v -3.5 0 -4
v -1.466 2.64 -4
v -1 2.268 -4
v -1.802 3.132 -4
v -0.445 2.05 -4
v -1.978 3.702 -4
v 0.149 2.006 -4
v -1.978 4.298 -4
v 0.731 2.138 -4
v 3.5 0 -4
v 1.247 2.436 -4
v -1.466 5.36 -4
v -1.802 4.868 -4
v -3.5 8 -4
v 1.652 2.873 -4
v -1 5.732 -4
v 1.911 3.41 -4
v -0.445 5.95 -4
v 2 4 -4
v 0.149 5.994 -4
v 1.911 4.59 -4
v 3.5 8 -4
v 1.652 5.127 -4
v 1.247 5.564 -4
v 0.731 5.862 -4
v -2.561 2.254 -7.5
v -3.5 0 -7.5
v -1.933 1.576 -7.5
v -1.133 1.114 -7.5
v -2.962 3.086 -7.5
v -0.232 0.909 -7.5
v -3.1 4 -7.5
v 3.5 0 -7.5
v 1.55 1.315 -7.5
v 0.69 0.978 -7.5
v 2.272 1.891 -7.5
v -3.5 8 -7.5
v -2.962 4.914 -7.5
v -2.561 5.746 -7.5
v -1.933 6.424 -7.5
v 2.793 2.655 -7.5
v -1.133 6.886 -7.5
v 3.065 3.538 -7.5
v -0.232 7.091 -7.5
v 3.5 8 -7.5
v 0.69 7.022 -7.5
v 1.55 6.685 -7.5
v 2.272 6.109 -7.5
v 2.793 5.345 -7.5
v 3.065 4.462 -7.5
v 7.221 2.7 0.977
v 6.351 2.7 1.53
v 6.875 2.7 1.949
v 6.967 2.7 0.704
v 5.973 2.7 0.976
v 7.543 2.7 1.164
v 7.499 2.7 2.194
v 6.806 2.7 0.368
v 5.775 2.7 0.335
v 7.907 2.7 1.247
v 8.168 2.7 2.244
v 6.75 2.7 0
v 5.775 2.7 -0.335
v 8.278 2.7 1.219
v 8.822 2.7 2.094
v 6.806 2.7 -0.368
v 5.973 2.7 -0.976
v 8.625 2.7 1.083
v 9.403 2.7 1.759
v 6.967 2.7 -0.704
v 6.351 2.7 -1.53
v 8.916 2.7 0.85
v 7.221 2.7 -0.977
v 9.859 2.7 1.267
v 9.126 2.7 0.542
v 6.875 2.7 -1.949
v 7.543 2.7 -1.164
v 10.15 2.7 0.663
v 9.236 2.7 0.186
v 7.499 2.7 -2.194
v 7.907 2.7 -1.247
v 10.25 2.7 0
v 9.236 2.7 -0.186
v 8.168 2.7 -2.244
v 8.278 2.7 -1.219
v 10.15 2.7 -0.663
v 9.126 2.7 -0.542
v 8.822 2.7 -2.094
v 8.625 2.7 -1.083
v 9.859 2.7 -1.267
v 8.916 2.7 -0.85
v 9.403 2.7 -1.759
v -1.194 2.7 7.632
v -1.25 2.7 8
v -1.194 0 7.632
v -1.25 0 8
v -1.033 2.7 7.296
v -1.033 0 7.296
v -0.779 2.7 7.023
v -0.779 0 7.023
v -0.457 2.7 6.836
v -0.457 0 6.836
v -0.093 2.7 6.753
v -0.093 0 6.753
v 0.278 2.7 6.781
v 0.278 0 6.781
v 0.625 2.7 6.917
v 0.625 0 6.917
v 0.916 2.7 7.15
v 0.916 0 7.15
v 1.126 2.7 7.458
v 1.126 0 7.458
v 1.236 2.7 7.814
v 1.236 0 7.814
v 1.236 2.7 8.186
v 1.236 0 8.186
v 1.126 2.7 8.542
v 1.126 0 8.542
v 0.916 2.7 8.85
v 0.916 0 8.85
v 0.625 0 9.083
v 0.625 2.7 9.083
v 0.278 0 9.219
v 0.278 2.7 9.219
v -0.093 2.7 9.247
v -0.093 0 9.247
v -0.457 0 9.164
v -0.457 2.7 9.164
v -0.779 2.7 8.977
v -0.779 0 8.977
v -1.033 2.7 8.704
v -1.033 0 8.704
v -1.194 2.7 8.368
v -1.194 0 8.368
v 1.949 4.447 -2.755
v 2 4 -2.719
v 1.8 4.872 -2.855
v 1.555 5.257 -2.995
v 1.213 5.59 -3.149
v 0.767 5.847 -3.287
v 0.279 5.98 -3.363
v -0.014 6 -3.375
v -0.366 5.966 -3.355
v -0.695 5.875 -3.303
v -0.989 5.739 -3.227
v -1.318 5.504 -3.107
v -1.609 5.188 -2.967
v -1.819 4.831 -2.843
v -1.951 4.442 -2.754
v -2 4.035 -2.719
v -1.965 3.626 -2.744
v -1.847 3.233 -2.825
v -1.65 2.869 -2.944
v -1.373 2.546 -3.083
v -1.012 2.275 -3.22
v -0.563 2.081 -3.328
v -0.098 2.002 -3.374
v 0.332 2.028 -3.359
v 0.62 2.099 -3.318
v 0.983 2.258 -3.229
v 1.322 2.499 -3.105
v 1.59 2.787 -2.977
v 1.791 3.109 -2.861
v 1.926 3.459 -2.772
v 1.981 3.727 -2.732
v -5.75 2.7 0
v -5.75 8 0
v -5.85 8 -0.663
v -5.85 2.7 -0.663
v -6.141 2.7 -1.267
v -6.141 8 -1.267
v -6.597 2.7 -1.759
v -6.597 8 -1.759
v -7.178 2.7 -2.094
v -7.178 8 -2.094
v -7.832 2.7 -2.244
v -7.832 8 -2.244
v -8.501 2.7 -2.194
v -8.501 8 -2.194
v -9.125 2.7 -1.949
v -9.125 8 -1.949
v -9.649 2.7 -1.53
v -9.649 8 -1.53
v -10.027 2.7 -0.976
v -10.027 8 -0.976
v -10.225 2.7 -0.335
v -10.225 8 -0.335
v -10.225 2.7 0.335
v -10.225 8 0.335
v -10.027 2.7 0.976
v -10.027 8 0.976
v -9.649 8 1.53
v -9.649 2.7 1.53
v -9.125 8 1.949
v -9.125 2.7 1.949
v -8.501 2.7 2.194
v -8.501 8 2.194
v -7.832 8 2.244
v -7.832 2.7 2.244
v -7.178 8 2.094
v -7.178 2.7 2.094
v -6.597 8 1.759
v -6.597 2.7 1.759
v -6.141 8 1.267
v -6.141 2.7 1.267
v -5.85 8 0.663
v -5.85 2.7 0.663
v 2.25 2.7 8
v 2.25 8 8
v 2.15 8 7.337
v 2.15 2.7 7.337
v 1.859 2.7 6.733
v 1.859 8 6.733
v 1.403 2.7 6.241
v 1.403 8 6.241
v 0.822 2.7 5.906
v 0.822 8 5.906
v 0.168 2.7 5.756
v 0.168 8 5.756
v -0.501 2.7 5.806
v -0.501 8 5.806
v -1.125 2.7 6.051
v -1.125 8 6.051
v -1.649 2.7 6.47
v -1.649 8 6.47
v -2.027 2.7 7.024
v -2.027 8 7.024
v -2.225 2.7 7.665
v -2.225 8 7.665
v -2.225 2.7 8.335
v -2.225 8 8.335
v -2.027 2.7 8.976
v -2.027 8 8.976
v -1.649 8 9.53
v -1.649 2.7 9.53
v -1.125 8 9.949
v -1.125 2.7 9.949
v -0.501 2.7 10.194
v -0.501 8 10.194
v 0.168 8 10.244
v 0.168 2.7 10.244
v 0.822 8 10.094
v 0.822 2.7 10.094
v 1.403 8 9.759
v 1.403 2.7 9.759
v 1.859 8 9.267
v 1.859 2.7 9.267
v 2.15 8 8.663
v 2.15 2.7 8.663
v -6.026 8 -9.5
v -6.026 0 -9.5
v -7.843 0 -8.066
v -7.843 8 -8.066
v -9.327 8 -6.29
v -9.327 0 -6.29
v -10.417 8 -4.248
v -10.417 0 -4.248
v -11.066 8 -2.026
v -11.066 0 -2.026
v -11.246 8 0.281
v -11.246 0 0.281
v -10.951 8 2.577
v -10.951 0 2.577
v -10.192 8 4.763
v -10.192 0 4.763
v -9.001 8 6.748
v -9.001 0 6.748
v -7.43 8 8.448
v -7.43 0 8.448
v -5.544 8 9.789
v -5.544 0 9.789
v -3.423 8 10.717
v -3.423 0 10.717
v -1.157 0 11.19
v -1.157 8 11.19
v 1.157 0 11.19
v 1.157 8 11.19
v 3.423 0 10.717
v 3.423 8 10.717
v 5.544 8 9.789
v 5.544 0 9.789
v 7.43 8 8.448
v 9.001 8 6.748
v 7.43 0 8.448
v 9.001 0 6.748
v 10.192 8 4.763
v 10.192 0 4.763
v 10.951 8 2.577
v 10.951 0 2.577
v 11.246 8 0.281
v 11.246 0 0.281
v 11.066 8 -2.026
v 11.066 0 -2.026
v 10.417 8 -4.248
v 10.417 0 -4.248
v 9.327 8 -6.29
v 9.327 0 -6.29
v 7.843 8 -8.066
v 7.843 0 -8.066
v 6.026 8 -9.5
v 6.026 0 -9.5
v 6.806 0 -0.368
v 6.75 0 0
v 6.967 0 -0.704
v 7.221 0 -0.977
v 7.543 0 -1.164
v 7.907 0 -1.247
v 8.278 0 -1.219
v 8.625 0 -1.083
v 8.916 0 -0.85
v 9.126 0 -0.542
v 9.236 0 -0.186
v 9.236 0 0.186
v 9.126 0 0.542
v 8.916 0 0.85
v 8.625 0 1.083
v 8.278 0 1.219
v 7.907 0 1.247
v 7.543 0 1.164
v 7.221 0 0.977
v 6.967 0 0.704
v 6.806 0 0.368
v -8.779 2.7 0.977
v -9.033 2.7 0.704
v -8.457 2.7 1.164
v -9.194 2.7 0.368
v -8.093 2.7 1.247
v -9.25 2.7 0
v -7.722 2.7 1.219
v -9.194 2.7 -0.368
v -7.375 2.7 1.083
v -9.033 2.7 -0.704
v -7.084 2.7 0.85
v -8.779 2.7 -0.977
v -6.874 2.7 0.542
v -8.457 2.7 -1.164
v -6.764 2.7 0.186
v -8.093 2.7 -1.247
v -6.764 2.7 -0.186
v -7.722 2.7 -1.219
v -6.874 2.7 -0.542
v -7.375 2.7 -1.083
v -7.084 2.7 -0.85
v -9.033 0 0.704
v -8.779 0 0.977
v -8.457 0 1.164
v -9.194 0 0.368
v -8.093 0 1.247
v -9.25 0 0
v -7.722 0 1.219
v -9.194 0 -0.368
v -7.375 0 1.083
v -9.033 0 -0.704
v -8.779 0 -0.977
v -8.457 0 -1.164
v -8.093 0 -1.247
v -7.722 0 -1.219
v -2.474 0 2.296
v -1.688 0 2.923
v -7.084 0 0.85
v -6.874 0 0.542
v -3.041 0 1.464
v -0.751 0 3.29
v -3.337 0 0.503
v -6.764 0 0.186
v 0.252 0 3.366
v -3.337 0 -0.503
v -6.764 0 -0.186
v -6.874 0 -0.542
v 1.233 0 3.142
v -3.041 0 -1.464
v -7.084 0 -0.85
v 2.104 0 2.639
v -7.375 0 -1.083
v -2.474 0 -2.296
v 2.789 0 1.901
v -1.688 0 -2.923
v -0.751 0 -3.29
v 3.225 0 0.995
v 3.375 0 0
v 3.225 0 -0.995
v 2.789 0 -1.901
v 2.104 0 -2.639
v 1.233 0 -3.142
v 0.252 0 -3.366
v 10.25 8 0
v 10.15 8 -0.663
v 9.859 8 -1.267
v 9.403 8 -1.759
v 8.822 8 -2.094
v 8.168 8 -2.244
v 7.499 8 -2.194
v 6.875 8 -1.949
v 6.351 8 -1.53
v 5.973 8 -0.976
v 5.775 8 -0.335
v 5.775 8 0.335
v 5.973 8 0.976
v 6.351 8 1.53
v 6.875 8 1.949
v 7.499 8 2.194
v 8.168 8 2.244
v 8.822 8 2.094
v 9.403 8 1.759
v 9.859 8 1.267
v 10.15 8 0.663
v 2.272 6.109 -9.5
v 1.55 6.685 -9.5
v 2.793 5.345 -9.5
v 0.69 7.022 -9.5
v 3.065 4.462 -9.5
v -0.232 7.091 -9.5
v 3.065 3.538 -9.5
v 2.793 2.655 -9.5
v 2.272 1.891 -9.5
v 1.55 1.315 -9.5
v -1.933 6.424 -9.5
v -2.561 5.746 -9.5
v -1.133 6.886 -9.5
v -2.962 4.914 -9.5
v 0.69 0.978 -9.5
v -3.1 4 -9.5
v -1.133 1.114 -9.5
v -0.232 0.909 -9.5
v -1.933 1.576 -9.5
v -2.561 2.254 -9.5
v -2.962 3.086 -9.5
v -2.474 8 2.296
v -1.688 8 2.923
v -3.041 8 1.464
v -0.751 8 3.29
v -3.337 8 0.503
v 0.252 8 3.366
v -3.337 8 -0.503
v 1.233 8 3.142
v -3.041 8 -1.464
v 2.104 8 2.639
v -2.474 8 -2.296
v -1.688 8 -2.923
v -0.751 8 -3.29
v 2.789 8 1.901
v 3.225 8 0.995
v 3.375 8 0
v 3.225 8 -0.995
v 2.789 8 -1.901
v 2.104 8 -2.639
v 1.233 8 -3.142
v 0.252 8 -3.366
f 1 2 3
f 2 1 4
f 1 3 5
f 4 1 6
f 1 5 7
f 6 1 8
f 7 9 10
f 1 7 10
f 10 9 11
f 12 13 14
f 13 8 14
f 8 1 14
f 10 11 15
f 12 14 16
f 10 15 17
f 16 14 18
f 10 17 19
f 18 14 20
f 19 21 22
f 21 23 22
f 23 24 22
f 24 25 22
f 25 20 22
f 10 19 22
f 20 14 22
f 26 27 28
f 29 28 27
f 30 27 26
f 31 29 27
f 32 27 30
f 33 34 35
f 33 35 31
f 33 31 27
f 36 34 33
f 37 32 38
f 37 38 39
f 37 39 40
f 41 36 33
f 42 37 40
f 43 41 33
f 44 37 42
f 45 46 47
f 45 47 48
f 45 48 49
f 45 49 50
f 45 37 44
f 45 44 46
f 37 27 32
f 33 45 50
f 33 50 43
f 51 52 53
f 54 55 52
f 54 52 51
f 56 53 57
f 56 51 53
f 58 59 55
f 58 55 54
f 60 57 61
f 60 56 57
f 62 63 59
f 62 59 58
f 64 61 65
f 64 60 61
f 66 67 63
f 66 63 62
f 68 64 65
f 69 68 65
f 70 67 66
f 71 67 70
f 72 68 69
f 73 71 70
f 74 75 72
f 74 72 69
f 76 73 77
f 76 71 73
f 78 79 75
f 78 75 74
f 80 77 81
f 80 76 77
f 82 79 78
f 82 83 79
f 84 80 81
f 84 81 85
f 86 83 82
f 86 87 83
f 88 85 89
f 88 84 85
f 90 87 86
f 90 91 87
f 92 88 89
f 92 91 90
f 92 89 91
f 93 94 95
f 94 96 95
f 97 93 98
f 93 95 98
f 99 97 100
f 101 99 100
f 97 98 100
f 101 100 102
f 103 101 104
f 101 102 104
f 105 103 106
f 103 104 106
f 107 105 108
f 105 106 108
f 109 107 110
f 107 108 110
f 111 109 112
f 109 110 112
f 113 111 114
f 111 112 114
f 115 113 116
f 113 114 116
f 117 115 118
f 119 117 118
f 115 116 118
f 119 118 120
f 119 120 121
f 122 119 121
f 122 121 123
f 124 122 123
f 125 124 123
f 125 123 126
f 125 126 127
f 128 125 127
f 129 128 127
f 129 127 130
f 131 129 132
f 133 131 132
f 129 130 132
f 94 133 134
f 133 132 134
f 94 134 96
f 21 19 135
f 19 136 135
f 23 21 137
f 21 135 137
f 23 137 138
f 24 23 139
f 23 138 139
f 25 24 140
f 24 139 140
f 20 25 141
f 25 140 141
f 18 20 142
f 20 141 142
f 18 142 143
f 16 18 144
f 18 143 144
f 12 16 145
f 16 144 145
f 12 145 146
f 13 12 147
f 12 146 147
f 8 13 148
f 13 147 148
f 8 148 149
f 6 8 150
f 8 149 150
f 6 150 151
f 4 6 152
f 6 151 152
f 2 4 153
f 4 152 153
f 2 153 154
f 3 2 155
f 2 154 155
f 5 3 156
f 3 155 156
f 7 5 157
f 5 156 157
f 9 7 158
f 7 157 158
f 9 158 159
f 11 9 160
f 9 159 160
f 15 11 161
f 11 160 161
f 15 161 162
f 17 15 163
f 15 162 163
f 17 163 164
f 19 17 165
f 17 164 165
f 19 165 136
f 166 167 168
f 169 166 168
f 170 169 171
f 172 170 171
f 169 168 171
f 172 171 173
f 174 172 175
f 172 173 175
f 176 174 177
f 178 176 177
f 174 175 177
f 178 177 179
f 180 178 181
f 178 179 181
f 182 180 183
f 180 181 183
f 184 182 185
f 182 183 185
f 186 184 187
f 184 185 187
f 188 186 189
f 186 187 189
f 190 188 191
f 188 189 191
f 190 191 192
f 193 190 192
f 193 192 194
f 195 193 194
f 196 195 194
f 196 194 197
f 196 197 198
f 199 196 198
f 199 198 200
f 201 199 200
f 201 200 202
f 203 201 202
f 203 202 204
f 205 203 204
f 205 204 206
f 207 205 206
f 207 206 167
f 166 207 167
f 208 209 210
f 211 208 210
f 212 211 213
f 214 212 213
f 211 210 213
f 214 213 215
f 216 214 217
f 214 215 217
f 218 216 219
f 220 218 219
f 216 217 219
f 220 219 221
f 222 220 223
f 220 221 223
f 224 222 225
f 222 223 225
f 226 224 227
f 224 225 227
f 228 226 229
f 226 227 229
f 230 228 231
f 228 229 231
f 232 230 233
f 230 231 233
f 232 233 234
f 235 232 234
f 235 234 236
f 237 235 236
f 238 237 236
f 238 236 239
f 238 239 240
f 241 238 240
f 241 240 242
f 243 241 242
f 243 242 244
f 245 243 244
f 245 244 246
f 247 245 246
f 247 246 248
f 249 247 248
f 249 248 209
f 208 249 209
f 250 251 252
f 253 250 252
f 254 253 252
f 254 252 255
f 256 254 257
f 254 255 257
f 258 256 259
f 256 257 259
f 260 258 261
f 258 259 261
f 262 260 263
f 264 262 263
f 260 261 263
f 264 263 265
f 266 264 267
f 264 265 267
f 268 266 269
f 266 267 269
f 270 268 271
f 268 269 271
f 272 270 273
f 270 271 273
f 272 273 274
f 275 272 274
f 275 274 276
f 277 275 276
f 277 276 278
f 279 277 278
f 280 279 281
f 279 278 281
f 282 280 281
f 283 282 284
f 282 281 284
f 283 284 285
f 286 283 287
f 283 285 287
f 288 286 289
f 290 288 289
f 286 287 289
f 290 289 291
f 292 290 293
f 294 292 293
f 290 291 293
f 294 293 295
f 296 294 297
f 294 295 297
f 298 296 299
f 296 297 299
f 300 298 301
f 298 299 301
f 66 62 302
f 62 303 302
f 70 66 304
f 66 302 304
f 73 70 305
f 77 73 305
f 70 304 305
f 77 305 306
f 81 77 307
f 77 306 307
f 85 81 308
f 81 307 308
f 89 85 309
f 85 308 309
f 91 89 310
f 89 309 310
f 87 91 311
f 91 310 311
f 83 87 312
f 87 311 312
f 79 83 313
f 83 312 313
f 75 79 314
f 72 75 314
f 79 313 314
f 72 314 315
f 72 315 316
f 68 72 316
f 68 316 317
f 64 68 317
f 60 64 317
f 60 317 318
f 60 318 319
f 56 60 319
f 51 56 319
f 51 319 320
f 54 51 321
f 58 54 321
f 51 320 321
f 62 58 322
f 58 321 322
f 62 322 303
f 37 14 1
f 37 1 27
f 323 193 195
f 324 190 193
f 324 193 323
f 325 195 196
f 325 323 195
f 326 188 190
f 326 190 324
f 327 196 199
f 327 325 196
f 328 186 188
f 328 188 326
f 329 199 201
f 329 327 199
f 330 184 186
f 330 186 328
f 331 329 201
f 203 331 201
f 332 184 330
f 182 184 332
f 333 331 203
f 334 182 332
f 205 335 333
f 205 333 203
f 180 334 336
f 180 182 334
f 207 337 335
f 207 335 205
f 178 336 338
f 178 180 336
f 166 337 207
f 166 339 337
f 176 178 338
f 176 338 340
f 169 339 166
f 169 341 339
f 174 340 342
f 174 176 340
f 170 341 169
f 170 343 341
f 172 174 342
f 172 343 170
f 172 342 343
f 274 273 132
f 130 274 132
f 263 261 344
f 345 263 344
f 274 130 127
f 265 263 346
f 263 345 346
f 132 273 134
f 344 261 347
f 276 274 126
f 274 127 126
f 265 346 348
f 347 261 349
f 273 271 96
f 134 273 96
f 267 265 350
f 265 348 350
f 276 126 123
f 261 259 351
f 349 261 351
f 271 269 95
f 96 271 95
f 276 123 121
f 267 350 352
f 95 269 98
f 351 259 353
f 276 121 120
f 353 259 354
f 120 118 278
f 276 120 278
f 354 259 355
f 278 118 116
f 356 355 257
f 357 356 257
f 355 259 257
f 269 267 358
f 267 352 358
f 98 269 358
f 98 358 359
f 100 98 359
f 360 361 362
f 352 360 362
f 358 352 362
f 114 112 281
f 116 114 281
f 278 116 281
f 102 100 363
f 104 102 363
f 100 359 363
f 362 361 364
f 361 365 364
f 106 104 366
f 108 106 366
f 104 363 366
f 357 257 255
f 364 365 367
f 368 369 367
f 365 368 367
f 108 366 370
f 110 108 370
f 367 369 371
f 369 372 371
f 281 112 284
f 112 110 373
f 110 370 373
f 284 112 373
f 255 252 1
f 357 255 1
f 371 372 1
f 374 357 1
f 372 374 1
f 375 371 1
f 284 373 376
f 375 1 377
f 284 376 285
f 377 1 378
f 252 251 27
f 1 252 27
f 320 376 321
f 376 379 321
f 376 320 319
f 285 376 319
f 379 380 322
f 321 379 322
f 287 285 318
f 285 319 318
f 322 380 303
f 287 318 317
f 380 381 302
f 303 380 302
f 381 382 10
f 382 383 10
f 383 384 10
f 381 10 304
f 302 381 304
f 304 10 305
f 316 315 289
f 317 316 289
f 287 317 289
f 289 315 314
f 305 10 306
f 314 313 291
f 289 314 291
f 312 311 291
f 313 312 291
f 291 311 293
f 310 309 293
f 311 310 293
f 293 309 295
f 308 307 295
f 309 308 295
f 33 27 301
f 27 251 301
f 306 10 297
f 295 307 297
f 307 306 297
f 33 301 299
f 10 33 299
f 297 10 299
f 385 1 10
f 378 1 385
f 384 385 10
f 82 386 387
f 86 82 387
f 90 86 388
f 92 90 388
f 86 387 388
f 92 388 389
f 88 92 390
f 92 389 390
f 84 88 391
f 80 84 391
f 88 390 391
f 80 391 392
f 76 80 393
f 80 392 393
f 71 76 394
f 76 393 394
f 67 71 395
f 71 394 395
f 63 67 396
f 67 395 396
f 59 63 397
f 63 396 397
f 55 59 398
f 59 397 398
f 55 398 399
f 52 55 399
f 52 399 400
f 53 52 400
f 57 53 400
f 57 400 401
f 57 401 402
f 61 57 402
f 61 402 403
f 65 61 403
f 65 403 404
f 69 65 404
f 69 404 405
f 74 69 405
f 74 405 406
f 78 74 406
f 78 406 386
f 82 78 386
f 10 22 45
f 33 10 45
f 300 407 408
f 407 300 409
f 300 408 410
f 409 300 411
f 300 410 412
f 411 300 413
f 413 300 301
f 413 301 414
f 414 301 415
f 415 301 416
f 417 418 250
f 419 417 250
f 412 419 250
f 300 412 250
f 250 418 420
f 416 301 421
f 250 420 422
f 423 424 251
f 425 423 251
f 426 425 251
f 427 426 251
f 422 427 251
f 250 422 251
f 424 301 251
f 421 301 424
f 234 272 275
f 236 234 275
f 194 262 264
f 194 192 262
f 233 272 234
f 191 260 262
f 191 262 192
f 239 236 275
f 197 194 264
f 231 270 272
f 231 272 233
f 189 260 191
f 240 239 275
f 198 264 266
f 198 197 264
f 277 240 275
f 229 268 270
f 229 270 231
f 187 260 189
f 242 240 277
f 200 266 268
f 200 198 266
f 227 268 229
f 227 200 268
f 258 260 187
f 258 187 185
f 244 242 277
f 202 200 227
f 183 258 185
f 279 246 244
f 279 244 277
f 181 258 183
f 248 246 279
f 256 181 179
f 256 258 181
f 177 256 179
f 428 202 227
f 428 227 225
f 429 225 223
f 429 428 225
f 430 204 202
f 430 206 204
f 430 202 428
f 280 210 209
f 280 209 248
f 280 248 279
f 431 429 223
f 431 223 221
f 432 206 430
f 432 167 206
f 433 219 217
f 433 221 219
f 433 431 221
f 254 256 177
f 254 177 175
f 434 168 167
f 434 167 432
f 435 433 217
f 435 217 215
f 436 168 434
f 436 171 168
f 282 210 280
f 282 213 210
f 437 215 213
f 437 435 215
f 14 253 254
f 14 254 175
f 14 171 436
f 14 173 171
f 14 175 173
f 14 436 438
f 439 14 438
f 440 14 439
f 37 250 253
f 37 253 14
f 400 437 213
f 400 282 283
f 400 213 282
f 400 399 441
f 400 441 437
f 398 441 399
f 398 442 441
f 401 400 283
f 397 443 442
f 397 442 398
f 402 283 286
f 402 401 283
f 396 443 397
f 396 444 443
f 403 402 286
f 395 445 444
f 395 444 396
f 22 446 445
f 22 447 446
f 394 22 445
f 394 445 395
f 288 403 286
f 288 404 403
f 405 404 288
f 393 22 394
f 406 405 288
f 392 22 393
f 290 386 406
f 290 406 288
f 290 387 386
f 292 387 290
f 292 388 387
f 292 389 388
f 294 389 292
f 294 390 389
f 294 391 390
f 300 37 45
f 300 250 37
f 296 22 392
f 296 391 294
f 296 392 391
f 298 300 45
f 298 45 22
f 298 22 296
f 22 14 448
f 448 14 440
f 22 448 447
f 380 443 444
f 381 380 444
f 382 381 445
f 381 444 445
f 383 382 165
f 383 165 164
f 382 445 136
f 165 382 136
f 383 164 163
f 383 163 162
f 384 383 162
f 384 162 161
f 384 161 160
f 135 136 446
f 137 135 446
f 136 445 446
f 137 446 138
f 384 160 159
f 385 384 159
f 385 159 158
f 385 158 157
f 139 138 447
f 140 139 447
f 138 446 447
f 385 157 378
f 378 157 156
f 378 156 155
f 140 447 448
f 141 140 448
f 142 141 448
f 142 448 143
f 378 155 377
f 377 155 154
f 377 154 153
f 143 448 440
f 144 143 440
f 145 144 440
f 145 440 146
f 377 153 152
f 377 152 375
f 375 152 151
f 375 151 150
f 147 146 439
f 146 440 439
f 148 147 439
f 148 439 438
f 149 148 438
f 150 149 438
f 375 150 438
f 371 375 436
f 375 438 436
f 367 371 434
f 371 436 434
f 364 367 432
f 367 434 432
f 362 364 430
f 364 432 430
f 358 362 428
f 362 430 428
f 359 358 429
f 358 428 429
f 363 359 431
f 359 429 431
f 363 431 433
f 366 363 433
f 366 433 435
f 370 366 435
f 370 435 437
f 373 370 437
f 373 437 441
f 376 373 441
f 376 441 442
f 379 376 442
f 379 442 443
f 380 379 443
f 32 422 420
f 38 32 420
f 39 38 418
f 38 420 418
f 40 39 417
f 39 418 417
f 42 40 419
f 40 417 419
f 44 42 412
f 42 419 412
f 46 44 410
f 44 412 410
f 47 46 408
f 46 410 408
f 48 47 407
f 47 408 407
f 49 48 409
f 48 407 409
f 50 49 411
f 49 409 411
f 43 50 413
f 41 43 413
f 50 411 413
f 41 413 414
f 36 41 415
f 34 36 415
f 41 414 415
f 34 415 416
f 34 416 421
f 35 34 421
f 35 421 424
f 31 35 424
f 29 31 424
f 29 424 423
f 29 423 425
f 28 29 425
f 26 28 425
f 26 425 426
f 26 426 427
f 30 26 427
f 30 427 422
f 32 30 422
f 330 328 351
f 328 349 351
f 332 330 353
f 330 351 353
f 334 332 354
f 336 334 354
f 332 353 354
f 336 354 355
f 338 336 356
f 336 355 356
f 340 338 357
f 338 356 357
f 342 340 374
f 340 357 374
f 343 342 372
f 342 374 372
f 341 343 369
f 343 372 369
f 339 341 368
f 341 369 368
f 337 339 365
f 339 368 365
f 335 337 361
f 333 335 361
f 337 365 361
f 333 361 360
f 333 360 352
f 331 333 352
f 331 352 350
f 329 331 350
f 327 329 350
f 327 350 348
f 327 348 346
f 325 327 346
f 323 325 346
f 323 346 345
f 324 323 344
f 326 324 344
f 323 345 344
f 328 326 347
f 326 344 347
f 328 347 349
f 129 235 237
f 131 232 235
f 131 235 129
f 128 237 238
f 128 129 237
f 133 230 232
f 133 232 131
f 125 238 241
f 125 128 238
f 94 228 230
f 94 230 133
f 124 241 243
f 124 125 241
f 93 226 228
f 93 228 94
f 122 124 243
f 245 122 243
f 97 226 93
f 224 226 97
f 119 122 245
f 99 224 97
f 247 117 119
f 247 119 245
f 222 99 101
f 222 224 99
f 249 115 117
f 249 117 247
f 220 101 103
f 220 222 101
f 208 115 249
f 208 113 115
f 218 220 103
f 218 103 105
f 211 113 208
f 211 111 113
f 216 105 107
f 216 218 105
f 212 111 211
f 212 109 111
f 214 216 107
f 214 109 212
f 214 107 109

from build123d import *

# Parameters (mm, degrees)
BOSS_EXTRU_1_DEPTH                              = 8
SKETCH1_R                                       = 3.375
CUT_EXTRUDE1_DEPTH                              = 9
ESQUISSE7_W                                     = 7
ESQUISSE7_H                                     = 3.5
ENL_V_MAT_EXTRU_2_DEPTH                         = 9
CHAMBRAGE_POUR_VIS_T_TE_CYLINDRIQUE_D           = 2.5
CHAMBRAGE_POUR_VIS_T_TE_CYLINDRIQUE_CBORE_D     = 4.5
CHAMBRAGE_POUR_VIS_T_TE_CYLINDRIQUE_CBORE_DEPTH = 5.3
CBORE_FOR_M5_HEX_HEAD_BOLT1_D                   = 4
CBORE_FOR_M5_HEX_HEAD_BOLT1_DEPTH               = 9.499
CBORE_FOR_M5_HEX_HEAD_BOLT1_CBORE_D             = 6.2
CBORE_FOR_M5_HEX_HEAD_BOLT1_CBORE_DEPTH         = 2
CBORE_FOR_M5_HEX_HEAD_BOLT1_TIP                 = 1.201721238


with BuildPart() as part:
    # Esquisse1 → Boss.-Extru.1 (new body)
    with BuildSketch(Plane(origin=(0, 0, 0), x_dir=(1, 0, 0), z_dir=(0, 1, 0))):
        with BuildLine():
            Line((6.025985397, 9.5), (-6.025985397, 9.5))
            ThreePointArc((-6.025985397, 9.5), (0, -11.25), (6.025985397, 9.5))
        make_face()
    extrude(amount=BOSS_EXTRU_1_DEPTH)

    # Sketch1 → Cut-Extrude1 (cut, through all)
    with BuildSketch(Plane(origin=(0, 8, 0), x_dir=(1, 0, 0), z_dir=(0, 1, 0))):
        Circle(SKETCH1_R)
    extrude(amount=-CUT_EXTRUDE1_DEPTH, mode=Mode.SUBTRACT)

    # Esquisse7 → Enlèv. mat.-Extru.2 (cut, through all)
    with BuildSketch(Plane(origin=(0, 8, 0), x_dir=(1, 0, 0), z_dir=(0, 1, 0))):
        with Locations((0, 5.75)):
            Rectangle(ESQUISSE7_W, ESQUISSE7_H)
    extrude(amount=-ENL_V_MAT_EXTRU_2_DEPTH, mode=Mode.SUBTRACT)

    # Chambrage pour vis à tête cylindrique à 6 pans creux (ou vis CHC) M21 (through all)
    with Locations(Plane(origin=(0, 8, 0), x_dir=(1, 0, 0), z_dir=(0, 1, 0))):
        with Locations((-8, 0), (0, -8), (8, 0)):
            CounterBoreHole(CHAMBRAGE_POUR_VIS_T_TE_CYLINDRIQUE_D / 2, CHAMBRAGE_POUR_VIS_T_TE_CYLINDRIQUE_CBORE_D / 2, CHAMBRAGE_POUR_VIS_T_TE_CYLINDRIQUE_CBORE_DEPTH)

    # CBORE for M5 Hex Head Bolt1
    with Locations(Plane(origin=(0, 0, -9.5), x_dir=(-1, 0, 0), z_dir=(0, 0, -1))):
        with Locations((0, 4)):
            CounterBoreHole(CBORE_FOR_M5_HEX_HEAD_BOLT1_D / 2, CBORE_FOR_M5_HEX_HEAD_BOLT1_CBORE_D / 2, CBORE_FOR_M5_HEX_HEAD_BOLT1_CBORE_DEPTH, depth=CBORE_FOR_M5_HEX_HEAD_BOLT1_DEPTH)
            with Locations((0, 0, -(CBORE_FOR_M5_HEX_HEAD_BOLT1_DEPTH + CBORE_FOR_M5_HEX_HEAD_BOLT1_TIP / 2))):  # 118° drill point
                Cone(0, CBORE_FOR_M5_HEX_HEAD_BOLT1_D / 2, CBORE_FOR_M5_HEX_HEAD_BOLT1_TIP, mode=Mode.SUBTRACT)


solid = part.part
